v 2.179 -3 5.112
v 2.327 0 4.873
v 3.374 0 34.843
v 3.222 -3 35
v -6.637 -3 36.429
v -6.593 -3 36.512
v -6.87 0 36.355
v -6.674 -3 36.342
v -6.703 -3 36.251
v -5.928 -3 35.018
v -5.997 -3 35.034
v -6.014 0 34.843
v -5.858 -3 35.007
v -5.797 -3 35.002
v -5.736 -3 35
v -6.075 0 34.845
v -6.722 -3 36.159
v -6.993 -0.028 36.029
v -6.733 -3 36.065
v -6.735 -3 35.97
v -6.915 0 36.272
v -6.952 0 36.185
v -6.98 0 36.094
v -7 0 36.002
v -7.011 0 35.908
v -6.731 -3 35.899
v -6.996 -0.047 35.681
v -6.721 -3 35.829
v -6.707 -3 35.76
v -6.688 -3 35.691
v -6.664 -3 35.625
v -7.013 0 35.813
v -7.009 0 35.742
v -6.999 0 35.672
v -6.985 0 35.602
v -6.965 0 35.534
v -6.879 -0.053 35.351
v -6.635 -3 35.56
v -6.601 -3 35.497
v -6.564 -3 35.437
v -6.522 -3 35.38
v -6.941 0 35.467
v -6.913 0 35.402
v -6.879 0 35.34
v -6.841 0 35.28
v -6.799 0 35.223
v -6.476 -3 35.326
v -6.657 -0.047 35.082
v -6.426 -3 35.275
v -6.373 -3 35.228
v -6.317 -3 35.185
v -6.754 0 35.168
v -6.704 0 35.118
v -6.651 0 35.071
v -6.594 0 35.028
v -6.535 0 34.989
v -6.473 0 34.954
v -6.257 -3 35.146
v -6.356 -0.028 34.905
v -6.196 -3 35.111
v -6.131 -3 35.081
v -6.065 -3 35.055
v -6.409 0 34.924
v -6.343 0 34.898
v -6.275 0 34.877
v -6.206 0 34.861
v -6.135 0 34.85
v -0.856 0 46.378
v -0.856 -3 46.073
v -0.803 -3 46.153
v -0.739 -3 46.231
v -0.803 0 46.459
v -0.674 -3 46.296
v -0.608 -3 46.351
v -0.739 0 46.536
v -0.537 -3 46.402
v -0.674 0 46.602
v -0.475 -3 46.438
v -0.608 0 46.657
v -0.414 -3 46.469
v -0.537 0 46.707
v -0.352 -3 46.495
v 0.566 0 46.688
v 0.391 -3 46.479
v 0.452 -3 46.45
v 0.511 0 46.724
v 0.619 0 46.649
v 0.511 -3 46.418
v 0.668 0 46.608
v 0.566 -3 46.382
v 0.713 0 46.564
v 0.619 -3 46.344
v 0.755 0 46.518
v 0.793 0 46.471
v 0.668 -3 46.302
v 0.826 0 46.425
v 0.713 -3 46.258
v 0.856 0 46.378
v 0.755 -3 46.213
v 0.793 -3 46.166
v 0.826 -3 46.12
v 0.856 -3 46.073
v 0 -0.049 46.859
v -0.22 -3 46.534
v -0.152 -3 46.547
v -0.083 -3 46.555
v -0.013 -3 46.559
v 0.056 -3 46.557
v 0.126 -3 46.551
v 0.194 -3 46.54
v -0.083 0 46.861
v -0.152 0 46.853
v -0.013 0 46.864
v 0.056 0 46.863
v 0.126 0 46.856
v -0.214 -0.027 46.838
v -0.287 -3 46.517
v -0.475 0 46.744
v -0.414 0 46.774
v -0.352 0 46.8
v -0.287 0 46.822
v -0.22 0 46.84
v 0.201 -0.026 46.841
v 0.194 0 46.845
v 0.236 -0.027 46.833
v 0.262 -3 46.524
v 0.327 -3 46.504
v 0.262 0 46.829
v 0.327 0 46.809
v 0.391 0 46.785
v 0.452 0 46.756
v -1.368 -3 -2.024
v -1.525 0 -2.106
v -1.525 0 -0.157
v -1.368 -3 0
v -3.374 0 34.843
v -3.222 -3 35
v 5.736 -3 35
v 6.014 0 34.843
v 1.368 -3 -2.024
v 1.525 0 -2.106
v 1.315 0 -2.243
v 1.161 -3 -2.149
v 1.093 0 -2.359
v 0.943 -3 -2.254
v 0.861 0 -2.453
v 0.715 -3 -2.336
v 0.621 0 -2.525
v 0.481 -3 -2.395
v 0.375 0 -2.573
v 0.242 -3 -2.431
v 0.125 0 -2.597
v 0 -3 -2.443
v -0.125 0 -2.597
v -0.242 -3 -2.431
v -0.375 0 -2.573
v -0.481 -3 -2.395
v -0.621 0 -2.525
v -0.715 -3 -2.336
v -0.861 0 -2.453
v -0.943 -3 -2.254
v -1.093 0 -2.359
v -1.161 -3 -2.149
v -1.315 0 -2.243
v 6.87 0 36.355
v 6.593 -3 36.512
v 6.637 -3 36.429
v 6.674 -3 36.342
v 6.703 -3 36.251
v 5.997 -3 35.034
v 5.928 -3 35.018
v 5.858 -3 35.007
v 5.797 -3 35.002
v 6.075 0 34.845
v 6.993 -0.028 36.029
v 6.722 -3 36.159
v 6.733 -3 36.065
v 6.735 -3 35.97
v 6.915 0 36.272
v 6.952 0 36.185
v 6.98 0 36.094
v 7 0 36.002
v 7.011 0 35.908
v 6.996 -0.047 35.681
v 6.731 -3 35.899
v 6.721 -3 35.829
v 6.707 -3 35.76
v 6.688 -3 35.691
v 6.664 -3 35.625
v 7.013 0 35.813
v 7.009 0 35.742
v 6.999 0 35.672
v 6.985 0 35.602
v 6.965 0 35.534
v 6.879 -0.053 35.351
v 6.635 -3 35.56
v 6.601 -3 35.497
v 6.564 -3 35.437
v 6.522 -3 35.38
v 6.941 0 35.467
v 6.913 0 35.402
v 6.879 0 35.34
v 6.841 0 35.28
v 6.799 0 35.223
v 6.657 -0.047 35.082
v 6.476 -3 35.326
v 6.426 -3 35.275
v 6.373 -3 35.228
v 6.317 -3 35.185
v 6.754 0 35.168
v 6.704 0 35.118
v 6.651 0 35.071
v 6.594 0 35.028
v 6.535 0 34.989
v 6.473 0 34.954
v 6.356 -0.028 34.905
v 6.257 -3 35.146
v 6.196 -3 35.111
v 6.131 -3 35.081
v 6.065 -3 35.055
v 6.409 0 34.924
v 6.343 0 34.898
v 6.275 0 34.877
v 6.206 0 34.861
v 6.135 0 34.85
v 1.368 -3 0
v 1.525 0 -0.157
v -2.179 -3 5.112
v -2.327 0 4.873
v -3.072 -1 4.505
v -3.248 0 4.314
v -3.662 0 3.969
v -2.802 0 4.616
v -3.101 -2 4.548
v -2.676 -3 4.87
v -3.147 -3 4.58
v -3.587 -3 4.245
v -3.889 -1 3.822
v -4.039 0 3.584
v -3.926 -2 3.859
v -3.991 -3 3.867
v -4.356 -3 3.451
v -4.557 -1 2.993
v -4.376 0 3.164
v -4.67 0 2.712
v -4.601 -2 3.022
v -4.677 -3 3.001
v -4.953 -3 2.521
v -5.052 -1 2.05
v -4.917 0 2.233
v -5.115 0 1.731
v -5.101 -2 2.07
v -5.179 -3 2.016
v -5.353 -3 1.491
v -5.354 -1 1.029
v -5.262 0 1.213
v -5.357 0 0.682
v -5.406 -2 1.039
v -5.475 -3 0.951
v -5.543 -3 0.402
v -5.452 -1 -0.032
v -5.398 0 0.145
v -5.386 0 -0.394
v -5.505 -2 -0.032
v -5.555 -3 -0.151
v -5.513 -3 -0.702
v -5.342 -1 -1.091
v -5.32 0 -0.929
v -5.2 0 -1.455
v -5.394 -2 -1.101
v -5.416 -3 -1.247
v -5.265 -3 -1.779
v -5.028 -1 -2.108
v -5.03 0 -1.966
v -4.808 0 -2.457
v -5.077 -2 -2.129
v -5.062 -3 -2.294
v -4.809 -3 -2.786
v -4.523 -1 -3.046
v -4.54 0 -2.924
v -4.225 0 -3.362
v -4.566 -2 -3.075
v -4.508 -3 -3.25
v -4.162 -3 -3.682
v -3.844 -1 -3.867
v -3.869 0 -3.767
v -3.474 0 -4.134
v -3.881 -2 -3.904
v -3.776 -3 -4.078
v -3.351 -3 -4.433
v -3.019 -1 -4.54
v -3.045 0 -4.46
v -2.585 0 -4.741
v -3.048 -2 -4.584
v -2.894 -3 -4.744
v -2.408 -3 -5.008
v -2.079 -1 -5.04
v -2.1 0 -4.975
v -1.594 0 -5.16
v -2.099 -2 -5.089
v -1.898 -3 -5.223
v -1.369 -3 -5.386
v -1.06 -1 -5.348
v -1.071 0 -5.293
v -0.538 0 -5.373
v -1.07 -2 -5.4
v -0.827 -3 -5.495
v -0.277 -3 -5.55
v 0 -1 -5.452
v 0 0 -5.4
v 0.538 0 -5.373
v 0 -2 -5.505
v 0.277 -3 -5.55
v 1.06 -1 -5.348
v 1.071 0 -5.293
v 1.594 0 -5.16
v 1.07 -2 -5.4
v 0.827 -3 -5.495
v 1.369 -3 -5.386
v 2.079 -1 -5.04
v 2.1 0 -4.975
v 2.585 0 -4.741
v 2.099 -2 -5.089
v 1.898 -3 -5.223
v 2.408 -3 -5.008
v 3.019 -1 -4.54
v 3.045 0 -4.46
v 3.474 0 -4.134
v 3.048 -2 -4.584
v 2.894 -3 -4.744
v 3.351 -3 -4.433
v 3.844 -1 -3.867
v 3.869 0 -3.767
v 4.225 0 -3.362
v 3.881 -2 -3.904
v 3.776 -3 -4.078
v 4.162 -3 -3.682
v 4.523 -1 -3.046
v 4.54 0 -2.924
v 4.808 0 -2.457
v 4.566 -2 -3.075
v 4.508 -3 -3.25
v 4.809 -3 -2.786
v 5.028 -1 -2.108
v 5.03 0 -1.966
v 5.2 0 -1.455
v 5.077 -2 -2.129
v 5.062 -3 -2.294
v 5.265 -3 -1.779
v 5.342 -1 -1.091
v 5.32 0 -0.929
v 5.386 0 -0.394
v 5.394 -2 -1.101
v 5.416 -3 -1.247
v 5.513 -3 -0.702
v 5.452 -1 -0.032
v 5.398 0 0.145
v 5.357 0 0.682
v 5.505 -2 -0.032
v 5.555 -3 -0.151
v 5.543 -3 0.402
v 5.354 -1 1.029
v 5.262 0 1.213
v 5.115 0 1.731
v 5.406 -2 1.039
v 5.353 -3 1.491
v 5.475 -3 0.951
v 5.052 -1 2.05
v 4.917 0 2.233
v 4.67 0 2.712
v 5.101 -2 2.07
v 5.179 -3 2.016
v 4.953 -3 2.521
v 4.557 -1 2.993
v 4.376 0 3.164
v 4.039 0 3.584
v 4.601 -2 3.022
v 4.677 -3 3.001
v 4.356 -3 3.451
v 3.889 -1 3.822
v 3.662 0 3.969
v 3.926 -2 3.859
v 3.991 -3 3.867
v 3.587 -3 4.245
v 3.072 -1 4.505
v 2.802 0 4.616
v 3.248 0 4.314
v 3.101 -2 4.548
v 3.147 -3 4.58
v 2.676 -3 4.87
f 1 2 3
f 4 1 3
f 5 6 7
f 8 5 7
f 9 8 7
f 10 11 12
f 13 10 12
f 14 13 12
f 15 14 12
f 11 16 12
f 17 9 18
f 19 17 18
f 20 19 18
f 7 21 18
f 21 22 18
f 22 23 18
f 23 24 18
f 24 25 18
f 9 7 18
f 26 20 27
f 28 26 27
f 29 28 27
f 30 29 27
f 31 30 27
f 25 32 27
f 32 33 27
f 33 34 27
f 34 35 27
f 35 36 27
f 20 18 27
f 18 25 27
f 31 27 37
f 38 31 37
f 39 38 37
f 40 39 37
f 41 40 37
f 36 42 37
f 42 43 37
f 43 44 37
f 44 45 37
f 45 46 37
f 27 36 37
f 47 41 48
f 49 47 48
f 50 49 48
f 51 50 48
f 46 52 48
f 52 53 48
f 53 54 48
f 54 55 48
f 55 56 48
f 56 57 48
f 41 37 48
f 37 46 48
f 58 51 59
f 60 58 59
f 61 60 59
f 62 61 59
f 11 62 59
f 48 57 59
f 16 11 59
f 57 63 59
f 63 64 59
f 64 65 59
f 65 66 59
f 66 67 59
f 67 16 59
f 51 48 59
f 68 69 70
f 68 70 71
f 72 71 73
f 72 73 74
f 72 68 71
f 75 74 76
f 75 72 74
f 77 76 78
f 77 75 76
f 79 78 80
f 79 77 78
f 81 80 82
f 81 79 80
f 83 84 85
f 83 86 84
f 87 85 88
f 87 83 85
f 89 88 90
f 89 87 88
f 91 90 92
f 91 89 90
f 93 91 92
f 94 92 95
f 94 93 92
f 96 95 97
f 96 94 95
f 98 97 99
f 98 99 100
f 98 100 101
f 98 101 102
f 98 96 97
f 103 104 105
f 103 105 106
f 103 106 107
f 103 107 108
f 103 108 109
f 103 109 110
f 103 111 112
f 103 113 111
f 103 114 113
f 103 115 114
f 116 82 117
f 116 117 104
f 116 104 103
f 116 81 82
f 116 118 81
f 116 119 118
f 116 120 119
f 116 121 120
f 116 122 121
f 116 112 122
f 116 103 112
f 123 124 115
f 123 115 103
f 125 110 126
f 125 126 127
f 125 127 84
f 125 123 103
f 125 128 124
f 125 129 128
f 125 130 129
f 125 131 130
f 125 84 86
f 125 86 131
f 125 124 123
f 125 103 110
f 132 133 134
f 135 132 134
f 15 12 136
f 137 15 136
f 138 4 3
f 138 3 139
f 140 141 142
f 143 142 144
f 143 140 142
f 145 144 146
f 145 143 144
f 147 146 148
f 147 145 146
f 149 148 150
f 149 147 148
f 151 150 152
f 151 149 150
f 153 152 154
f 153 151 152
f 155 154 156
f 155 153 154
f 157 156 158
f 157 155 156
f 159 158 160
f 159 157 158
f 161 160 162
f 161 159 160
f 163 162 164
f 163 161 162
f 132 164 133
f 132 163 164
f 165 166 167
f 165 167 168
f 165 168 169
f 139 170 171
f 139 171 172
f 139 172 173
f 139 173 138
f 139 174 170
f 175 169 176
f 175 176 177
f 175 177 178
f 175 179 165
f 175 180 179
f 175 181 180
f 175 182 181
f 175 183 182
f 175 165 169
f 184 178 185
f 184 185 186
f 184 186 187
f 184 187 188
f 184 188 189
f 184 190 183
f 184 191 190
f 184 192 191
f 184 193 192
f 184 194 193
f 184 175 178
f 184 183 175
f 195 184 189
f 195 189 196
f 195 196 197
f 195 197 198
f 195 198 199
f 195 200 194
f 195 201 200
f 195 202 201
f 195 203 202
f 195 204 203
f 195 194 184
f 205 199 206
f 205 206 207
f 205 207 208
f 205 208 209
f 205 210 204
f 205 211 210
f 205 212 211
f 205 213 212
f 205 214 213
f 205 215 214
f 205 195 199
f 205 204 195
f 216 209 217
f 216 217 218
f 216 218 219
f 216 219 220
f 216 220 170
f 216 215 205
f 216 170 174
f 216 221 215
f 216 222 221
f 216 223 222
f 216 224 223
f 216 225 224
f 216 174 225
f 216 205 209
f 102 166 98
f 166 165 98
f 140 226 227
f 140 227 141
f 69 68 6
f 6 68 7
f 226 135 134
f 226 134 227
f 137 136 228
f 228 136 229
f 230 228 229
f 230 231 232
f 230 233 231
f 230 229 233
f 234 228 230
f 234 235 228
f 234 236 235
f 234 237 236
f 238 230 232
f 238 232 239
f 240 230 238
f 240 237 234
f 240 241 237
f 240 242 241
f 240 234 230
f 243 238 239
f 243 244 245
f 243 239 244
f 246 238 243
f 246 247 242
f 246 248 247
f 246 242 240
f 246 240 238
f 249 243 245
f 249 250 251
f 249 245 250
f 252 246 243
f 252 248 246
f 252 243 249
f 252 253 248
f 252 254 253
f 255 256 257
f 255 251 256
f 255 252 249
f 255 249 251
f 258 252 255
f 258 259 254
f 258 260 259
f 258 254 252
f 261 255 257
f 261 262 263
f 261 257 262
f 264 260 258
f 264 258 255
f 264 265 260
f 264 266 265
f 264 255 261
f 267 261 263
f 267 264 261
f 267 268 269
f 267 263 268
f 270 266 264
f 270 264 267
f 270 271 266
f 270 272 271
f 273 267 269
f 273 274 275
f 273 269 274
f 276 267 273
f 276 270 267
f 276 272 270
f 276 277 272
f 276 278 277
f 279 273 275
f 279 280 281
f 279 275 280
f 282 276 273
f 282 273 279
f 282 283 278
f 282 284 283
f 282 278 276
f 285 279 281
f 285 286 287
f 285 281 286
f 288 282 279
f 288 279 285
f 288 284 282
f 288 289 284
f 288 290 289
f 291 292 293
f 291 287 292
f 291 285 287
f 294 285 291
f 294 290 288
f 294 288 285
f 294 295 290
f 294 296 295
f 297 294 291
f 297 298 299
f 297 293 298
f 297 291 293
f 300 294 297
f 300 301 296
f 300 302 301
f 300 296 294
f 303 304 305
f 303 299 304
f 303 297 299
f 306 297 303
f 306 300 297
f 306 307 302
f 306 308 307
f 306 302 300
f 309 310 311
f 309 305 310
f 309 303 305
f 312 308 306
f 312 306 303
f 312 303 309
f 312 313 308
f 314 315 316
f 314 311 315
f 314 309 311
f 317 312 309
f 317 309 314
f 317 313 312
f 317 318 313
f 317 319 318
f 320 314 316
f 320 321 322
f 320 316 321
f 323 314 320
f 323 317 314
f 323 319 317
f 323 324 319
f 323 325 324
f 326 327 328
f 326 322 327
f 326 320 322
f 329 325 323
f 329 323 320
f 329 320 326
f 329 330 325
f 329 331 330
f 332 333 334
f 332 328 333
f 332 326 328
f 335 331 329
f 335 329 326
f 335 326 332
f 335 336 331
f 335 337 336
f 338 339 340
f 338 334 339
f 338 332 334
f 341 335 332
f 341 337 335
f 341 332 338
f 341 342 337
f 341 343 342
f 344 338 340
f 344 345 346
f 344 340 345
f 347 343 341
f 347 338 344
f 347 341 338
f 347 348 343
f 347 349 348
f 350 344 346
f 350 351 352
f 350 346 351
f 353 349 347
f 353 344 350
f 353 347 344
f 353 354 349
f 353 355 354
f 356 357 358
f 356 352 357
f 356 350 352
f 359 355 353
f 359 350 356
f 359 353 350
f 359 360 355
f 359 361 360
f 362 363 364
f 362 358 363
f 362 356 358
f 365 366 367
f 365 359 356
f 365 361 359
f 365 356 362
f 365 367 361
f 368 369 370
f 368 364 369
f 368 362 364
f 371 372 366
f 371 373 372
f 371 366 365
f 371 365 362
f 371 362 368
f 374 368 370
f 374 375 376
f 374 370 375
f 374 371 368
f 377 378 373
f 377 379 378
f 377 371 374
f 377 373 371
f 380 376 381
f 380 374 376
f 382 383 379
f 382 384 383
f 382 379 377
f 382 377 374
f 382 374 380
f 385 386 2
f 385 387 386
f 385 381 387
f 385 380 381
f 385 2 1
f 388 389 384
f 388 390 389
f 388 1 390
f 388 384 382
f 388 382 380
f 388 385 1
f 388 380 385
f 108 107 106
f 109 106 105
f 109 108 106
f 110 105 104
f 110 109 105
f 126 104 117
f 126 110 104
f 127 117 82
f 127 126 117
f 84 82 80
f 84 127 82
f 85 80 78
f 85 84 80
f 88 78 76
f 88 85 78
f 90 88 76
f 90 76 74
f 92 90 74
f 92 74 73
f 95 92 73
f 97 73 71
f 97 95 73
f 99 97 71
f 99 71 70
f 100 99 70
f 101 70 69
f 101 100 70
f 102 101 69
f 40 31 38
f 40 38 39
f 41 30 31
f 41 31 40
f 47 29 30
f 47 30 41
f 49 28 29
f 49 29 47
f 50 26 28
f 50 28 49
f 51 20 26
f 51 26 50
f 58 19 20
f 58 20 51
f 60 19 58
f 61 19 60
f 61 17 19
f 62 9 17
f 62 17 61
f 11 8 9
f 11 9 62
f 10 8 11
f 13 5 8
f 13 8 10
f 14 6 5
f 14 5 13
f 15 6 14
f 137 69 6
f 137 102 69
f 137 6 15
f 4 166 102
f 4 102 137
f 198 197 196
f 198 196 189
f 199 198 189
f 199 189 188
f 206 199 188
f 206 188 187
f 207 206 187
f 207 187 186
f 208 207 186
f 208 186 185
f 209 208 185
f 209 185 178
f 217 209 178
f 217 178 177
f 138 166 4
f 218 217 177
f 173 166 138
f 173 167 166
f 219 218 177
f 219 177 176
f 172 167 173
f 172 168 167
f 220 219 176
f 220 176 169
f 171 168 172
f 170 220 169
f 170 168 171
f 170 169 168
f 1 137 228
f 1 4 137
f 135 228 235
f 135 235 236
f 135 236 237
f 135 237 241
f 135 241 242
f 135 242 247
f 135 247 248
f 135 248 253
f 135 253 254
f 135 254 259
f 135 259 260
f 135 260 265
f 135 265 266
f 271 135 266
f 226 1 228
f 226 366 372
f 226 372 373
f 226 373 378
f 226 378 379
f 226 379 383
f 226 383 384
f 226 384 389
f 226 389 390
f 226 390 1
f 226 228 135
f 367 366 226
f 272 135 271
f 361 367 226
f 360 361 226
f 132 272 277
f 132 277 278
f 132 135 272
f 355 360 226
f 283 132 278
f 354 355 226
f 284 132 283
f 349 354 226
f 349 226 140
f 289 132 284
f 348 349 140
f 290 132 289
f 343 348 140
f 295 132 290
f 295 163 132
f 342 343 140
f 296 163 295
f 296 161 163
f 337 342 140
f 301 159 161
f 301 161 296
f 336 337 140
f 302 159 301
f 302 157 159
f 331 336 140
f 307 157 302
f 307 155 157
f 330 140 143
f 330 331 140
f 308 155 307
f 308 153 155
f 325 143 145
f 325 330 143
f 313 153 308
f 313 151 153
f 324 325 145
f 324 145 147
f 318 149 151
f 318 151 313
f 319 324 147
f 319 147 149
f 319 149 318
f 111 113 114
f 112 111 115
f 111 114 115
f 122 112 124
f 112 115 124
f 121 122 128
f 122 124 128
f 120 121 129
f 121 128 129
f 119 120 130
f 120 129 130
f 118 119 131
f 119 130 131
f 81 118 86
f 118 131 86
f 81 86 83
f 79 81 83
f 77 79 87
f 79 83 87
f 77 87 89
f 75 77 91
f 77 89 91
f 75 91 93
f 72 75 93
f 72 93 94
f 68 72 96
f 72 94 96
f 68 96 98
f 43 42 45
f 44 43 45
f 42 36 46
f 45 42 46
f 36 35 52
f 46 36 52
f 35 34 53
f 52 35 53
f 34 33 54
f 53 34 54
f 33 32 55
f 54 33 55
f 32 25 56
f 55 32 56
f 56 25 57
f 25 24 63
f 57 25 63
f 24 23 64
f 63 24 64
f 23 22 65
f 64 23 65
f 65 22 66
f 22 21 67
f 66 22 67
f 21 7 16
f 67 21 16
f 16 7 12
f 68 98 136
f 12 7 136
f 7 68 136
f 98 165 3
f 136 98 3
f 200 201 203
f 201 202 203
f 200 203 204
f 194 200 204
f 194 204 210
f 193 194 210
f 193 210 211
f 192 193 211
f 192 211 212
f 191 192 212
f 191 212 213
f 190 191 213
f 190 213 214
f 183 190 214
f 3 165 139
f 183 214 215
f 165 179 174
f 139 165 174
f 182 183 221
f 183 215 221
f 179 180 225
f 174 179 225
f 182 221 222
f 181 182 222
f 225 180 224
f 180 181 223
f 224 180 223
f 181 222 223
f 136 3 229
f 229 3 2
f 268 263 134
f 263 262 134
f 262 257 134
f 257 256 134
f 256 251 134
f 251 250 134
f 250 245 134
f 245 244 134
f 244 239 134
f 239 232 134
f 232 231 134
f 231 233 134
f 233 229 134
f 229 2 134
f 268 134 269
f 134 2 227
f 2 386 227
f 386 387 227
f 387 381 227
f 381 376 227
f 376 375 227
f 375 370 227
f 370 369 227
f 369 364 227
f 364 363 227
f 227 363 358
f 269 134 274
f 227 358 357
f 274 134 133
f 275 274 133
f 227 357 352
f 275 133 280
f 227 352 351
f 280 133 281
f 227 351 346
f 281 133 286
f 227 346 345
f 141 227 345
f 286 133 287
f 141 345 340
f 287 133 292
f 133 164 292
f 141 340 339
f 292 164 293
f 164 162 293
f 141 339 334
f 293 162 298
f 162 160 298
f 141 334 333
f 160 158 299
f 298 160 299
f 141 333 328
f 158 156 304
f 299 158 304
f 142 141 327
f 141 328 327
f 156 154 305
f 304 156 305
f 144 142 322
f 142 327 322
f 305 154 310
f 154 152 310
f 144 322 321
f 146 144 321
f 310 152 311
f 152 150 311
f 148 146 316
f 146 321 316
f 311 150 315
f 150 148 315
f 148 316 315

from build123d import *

# Parameters (mm, degrees)
F0_R     = 5.4
F1_DEPTH = 3
F1_TAPER = -3
F3_DEPTH = 3
F3_TAPER = -3
F5_DEPTH = 3
F5_TAPER = -3
F6_R     = 1


with BuildPart() as f1:
    # F0 (on Front) → F1 (new body)
    with BuildSketch(Plane.XZ):
        Circle(F0_R)
        with BuildLine():
            ThreePointArc((1.525, 2.1057955741), (2.3157072354, 1.1821590418), (2.6, 0))
            ThreePointArc((2.6, 0), (2.3157072354, -1.1821590418), (1.525, -2.1057955741))
            ThreePointArc((1.525, -2.1057955741), (0, -2.6), (-1.525, -2.1057955741))
            ThreePointArc((-1.525, -2.1057955741), (-2.6, 0), (-1.525, 2.1057955741))
            ThreePointArc((-1.525, 2.1057955741), (0, 2.6), (1.525, 2.1057955741))
        make_face(mode=Mode.SUBTRACT)
        with BuildLine():
            ThreePointArc((1.525, -2.1057955741), (2.3157072354, -1.1821590418), (2.6, 0))
            ThreePointArc((2.6, 0), (2.3157072354, 1.1821590418), (1.525, 2.1057955741))
            Line((1.525, 2.1057955741), (1.525, -2.1057955741))
        make_face()
        with BuildLine():
            Line((-1.525, -2.1057955741), (-1.525, 2.1057955741))
            ThreePointArc((-1.525, 2.1057955741), (-2.6, 0), (-1.525, -2.1057955741))
        make_face()
    extrude(amount=F1_DEPTH, taper=F1_TAPER)

    # F2 (on face) → F3 (join)
    with BuildSketch(Plane.XZ.offset(3)):
        Polygon((3.2222269322, 35), (0, 35), (-3.2222269322, 35), (-2, 0), (0, 0), (2, 0), align=None)
    extrude(amount=-F3_DEPTH, taper=F3_TAPER)

    # F4 (on face) → F5 (join)
    with BuildSketch(Plane.XZ.offset(3)):
        Polygon((0, 47.5), (-7.5, 35), (-3.2222269322, 35), (3.2222269322, 35), (7.5, 35), align=None)
    extrude(amount=-F5_DEPTH, taper=F5_TAPER)

    # F6
    f6_edges = [f1.edges().sort_by_distance(p)[0] for p in [
        (0, -1.5, 47.652794),
        (-7.638843, -1.5, 34.921388),
        (7.638843, -1.5, 34.921388),
    ]]
    fillet(f6_edges, radius=F6_R)


solid = f1.part
